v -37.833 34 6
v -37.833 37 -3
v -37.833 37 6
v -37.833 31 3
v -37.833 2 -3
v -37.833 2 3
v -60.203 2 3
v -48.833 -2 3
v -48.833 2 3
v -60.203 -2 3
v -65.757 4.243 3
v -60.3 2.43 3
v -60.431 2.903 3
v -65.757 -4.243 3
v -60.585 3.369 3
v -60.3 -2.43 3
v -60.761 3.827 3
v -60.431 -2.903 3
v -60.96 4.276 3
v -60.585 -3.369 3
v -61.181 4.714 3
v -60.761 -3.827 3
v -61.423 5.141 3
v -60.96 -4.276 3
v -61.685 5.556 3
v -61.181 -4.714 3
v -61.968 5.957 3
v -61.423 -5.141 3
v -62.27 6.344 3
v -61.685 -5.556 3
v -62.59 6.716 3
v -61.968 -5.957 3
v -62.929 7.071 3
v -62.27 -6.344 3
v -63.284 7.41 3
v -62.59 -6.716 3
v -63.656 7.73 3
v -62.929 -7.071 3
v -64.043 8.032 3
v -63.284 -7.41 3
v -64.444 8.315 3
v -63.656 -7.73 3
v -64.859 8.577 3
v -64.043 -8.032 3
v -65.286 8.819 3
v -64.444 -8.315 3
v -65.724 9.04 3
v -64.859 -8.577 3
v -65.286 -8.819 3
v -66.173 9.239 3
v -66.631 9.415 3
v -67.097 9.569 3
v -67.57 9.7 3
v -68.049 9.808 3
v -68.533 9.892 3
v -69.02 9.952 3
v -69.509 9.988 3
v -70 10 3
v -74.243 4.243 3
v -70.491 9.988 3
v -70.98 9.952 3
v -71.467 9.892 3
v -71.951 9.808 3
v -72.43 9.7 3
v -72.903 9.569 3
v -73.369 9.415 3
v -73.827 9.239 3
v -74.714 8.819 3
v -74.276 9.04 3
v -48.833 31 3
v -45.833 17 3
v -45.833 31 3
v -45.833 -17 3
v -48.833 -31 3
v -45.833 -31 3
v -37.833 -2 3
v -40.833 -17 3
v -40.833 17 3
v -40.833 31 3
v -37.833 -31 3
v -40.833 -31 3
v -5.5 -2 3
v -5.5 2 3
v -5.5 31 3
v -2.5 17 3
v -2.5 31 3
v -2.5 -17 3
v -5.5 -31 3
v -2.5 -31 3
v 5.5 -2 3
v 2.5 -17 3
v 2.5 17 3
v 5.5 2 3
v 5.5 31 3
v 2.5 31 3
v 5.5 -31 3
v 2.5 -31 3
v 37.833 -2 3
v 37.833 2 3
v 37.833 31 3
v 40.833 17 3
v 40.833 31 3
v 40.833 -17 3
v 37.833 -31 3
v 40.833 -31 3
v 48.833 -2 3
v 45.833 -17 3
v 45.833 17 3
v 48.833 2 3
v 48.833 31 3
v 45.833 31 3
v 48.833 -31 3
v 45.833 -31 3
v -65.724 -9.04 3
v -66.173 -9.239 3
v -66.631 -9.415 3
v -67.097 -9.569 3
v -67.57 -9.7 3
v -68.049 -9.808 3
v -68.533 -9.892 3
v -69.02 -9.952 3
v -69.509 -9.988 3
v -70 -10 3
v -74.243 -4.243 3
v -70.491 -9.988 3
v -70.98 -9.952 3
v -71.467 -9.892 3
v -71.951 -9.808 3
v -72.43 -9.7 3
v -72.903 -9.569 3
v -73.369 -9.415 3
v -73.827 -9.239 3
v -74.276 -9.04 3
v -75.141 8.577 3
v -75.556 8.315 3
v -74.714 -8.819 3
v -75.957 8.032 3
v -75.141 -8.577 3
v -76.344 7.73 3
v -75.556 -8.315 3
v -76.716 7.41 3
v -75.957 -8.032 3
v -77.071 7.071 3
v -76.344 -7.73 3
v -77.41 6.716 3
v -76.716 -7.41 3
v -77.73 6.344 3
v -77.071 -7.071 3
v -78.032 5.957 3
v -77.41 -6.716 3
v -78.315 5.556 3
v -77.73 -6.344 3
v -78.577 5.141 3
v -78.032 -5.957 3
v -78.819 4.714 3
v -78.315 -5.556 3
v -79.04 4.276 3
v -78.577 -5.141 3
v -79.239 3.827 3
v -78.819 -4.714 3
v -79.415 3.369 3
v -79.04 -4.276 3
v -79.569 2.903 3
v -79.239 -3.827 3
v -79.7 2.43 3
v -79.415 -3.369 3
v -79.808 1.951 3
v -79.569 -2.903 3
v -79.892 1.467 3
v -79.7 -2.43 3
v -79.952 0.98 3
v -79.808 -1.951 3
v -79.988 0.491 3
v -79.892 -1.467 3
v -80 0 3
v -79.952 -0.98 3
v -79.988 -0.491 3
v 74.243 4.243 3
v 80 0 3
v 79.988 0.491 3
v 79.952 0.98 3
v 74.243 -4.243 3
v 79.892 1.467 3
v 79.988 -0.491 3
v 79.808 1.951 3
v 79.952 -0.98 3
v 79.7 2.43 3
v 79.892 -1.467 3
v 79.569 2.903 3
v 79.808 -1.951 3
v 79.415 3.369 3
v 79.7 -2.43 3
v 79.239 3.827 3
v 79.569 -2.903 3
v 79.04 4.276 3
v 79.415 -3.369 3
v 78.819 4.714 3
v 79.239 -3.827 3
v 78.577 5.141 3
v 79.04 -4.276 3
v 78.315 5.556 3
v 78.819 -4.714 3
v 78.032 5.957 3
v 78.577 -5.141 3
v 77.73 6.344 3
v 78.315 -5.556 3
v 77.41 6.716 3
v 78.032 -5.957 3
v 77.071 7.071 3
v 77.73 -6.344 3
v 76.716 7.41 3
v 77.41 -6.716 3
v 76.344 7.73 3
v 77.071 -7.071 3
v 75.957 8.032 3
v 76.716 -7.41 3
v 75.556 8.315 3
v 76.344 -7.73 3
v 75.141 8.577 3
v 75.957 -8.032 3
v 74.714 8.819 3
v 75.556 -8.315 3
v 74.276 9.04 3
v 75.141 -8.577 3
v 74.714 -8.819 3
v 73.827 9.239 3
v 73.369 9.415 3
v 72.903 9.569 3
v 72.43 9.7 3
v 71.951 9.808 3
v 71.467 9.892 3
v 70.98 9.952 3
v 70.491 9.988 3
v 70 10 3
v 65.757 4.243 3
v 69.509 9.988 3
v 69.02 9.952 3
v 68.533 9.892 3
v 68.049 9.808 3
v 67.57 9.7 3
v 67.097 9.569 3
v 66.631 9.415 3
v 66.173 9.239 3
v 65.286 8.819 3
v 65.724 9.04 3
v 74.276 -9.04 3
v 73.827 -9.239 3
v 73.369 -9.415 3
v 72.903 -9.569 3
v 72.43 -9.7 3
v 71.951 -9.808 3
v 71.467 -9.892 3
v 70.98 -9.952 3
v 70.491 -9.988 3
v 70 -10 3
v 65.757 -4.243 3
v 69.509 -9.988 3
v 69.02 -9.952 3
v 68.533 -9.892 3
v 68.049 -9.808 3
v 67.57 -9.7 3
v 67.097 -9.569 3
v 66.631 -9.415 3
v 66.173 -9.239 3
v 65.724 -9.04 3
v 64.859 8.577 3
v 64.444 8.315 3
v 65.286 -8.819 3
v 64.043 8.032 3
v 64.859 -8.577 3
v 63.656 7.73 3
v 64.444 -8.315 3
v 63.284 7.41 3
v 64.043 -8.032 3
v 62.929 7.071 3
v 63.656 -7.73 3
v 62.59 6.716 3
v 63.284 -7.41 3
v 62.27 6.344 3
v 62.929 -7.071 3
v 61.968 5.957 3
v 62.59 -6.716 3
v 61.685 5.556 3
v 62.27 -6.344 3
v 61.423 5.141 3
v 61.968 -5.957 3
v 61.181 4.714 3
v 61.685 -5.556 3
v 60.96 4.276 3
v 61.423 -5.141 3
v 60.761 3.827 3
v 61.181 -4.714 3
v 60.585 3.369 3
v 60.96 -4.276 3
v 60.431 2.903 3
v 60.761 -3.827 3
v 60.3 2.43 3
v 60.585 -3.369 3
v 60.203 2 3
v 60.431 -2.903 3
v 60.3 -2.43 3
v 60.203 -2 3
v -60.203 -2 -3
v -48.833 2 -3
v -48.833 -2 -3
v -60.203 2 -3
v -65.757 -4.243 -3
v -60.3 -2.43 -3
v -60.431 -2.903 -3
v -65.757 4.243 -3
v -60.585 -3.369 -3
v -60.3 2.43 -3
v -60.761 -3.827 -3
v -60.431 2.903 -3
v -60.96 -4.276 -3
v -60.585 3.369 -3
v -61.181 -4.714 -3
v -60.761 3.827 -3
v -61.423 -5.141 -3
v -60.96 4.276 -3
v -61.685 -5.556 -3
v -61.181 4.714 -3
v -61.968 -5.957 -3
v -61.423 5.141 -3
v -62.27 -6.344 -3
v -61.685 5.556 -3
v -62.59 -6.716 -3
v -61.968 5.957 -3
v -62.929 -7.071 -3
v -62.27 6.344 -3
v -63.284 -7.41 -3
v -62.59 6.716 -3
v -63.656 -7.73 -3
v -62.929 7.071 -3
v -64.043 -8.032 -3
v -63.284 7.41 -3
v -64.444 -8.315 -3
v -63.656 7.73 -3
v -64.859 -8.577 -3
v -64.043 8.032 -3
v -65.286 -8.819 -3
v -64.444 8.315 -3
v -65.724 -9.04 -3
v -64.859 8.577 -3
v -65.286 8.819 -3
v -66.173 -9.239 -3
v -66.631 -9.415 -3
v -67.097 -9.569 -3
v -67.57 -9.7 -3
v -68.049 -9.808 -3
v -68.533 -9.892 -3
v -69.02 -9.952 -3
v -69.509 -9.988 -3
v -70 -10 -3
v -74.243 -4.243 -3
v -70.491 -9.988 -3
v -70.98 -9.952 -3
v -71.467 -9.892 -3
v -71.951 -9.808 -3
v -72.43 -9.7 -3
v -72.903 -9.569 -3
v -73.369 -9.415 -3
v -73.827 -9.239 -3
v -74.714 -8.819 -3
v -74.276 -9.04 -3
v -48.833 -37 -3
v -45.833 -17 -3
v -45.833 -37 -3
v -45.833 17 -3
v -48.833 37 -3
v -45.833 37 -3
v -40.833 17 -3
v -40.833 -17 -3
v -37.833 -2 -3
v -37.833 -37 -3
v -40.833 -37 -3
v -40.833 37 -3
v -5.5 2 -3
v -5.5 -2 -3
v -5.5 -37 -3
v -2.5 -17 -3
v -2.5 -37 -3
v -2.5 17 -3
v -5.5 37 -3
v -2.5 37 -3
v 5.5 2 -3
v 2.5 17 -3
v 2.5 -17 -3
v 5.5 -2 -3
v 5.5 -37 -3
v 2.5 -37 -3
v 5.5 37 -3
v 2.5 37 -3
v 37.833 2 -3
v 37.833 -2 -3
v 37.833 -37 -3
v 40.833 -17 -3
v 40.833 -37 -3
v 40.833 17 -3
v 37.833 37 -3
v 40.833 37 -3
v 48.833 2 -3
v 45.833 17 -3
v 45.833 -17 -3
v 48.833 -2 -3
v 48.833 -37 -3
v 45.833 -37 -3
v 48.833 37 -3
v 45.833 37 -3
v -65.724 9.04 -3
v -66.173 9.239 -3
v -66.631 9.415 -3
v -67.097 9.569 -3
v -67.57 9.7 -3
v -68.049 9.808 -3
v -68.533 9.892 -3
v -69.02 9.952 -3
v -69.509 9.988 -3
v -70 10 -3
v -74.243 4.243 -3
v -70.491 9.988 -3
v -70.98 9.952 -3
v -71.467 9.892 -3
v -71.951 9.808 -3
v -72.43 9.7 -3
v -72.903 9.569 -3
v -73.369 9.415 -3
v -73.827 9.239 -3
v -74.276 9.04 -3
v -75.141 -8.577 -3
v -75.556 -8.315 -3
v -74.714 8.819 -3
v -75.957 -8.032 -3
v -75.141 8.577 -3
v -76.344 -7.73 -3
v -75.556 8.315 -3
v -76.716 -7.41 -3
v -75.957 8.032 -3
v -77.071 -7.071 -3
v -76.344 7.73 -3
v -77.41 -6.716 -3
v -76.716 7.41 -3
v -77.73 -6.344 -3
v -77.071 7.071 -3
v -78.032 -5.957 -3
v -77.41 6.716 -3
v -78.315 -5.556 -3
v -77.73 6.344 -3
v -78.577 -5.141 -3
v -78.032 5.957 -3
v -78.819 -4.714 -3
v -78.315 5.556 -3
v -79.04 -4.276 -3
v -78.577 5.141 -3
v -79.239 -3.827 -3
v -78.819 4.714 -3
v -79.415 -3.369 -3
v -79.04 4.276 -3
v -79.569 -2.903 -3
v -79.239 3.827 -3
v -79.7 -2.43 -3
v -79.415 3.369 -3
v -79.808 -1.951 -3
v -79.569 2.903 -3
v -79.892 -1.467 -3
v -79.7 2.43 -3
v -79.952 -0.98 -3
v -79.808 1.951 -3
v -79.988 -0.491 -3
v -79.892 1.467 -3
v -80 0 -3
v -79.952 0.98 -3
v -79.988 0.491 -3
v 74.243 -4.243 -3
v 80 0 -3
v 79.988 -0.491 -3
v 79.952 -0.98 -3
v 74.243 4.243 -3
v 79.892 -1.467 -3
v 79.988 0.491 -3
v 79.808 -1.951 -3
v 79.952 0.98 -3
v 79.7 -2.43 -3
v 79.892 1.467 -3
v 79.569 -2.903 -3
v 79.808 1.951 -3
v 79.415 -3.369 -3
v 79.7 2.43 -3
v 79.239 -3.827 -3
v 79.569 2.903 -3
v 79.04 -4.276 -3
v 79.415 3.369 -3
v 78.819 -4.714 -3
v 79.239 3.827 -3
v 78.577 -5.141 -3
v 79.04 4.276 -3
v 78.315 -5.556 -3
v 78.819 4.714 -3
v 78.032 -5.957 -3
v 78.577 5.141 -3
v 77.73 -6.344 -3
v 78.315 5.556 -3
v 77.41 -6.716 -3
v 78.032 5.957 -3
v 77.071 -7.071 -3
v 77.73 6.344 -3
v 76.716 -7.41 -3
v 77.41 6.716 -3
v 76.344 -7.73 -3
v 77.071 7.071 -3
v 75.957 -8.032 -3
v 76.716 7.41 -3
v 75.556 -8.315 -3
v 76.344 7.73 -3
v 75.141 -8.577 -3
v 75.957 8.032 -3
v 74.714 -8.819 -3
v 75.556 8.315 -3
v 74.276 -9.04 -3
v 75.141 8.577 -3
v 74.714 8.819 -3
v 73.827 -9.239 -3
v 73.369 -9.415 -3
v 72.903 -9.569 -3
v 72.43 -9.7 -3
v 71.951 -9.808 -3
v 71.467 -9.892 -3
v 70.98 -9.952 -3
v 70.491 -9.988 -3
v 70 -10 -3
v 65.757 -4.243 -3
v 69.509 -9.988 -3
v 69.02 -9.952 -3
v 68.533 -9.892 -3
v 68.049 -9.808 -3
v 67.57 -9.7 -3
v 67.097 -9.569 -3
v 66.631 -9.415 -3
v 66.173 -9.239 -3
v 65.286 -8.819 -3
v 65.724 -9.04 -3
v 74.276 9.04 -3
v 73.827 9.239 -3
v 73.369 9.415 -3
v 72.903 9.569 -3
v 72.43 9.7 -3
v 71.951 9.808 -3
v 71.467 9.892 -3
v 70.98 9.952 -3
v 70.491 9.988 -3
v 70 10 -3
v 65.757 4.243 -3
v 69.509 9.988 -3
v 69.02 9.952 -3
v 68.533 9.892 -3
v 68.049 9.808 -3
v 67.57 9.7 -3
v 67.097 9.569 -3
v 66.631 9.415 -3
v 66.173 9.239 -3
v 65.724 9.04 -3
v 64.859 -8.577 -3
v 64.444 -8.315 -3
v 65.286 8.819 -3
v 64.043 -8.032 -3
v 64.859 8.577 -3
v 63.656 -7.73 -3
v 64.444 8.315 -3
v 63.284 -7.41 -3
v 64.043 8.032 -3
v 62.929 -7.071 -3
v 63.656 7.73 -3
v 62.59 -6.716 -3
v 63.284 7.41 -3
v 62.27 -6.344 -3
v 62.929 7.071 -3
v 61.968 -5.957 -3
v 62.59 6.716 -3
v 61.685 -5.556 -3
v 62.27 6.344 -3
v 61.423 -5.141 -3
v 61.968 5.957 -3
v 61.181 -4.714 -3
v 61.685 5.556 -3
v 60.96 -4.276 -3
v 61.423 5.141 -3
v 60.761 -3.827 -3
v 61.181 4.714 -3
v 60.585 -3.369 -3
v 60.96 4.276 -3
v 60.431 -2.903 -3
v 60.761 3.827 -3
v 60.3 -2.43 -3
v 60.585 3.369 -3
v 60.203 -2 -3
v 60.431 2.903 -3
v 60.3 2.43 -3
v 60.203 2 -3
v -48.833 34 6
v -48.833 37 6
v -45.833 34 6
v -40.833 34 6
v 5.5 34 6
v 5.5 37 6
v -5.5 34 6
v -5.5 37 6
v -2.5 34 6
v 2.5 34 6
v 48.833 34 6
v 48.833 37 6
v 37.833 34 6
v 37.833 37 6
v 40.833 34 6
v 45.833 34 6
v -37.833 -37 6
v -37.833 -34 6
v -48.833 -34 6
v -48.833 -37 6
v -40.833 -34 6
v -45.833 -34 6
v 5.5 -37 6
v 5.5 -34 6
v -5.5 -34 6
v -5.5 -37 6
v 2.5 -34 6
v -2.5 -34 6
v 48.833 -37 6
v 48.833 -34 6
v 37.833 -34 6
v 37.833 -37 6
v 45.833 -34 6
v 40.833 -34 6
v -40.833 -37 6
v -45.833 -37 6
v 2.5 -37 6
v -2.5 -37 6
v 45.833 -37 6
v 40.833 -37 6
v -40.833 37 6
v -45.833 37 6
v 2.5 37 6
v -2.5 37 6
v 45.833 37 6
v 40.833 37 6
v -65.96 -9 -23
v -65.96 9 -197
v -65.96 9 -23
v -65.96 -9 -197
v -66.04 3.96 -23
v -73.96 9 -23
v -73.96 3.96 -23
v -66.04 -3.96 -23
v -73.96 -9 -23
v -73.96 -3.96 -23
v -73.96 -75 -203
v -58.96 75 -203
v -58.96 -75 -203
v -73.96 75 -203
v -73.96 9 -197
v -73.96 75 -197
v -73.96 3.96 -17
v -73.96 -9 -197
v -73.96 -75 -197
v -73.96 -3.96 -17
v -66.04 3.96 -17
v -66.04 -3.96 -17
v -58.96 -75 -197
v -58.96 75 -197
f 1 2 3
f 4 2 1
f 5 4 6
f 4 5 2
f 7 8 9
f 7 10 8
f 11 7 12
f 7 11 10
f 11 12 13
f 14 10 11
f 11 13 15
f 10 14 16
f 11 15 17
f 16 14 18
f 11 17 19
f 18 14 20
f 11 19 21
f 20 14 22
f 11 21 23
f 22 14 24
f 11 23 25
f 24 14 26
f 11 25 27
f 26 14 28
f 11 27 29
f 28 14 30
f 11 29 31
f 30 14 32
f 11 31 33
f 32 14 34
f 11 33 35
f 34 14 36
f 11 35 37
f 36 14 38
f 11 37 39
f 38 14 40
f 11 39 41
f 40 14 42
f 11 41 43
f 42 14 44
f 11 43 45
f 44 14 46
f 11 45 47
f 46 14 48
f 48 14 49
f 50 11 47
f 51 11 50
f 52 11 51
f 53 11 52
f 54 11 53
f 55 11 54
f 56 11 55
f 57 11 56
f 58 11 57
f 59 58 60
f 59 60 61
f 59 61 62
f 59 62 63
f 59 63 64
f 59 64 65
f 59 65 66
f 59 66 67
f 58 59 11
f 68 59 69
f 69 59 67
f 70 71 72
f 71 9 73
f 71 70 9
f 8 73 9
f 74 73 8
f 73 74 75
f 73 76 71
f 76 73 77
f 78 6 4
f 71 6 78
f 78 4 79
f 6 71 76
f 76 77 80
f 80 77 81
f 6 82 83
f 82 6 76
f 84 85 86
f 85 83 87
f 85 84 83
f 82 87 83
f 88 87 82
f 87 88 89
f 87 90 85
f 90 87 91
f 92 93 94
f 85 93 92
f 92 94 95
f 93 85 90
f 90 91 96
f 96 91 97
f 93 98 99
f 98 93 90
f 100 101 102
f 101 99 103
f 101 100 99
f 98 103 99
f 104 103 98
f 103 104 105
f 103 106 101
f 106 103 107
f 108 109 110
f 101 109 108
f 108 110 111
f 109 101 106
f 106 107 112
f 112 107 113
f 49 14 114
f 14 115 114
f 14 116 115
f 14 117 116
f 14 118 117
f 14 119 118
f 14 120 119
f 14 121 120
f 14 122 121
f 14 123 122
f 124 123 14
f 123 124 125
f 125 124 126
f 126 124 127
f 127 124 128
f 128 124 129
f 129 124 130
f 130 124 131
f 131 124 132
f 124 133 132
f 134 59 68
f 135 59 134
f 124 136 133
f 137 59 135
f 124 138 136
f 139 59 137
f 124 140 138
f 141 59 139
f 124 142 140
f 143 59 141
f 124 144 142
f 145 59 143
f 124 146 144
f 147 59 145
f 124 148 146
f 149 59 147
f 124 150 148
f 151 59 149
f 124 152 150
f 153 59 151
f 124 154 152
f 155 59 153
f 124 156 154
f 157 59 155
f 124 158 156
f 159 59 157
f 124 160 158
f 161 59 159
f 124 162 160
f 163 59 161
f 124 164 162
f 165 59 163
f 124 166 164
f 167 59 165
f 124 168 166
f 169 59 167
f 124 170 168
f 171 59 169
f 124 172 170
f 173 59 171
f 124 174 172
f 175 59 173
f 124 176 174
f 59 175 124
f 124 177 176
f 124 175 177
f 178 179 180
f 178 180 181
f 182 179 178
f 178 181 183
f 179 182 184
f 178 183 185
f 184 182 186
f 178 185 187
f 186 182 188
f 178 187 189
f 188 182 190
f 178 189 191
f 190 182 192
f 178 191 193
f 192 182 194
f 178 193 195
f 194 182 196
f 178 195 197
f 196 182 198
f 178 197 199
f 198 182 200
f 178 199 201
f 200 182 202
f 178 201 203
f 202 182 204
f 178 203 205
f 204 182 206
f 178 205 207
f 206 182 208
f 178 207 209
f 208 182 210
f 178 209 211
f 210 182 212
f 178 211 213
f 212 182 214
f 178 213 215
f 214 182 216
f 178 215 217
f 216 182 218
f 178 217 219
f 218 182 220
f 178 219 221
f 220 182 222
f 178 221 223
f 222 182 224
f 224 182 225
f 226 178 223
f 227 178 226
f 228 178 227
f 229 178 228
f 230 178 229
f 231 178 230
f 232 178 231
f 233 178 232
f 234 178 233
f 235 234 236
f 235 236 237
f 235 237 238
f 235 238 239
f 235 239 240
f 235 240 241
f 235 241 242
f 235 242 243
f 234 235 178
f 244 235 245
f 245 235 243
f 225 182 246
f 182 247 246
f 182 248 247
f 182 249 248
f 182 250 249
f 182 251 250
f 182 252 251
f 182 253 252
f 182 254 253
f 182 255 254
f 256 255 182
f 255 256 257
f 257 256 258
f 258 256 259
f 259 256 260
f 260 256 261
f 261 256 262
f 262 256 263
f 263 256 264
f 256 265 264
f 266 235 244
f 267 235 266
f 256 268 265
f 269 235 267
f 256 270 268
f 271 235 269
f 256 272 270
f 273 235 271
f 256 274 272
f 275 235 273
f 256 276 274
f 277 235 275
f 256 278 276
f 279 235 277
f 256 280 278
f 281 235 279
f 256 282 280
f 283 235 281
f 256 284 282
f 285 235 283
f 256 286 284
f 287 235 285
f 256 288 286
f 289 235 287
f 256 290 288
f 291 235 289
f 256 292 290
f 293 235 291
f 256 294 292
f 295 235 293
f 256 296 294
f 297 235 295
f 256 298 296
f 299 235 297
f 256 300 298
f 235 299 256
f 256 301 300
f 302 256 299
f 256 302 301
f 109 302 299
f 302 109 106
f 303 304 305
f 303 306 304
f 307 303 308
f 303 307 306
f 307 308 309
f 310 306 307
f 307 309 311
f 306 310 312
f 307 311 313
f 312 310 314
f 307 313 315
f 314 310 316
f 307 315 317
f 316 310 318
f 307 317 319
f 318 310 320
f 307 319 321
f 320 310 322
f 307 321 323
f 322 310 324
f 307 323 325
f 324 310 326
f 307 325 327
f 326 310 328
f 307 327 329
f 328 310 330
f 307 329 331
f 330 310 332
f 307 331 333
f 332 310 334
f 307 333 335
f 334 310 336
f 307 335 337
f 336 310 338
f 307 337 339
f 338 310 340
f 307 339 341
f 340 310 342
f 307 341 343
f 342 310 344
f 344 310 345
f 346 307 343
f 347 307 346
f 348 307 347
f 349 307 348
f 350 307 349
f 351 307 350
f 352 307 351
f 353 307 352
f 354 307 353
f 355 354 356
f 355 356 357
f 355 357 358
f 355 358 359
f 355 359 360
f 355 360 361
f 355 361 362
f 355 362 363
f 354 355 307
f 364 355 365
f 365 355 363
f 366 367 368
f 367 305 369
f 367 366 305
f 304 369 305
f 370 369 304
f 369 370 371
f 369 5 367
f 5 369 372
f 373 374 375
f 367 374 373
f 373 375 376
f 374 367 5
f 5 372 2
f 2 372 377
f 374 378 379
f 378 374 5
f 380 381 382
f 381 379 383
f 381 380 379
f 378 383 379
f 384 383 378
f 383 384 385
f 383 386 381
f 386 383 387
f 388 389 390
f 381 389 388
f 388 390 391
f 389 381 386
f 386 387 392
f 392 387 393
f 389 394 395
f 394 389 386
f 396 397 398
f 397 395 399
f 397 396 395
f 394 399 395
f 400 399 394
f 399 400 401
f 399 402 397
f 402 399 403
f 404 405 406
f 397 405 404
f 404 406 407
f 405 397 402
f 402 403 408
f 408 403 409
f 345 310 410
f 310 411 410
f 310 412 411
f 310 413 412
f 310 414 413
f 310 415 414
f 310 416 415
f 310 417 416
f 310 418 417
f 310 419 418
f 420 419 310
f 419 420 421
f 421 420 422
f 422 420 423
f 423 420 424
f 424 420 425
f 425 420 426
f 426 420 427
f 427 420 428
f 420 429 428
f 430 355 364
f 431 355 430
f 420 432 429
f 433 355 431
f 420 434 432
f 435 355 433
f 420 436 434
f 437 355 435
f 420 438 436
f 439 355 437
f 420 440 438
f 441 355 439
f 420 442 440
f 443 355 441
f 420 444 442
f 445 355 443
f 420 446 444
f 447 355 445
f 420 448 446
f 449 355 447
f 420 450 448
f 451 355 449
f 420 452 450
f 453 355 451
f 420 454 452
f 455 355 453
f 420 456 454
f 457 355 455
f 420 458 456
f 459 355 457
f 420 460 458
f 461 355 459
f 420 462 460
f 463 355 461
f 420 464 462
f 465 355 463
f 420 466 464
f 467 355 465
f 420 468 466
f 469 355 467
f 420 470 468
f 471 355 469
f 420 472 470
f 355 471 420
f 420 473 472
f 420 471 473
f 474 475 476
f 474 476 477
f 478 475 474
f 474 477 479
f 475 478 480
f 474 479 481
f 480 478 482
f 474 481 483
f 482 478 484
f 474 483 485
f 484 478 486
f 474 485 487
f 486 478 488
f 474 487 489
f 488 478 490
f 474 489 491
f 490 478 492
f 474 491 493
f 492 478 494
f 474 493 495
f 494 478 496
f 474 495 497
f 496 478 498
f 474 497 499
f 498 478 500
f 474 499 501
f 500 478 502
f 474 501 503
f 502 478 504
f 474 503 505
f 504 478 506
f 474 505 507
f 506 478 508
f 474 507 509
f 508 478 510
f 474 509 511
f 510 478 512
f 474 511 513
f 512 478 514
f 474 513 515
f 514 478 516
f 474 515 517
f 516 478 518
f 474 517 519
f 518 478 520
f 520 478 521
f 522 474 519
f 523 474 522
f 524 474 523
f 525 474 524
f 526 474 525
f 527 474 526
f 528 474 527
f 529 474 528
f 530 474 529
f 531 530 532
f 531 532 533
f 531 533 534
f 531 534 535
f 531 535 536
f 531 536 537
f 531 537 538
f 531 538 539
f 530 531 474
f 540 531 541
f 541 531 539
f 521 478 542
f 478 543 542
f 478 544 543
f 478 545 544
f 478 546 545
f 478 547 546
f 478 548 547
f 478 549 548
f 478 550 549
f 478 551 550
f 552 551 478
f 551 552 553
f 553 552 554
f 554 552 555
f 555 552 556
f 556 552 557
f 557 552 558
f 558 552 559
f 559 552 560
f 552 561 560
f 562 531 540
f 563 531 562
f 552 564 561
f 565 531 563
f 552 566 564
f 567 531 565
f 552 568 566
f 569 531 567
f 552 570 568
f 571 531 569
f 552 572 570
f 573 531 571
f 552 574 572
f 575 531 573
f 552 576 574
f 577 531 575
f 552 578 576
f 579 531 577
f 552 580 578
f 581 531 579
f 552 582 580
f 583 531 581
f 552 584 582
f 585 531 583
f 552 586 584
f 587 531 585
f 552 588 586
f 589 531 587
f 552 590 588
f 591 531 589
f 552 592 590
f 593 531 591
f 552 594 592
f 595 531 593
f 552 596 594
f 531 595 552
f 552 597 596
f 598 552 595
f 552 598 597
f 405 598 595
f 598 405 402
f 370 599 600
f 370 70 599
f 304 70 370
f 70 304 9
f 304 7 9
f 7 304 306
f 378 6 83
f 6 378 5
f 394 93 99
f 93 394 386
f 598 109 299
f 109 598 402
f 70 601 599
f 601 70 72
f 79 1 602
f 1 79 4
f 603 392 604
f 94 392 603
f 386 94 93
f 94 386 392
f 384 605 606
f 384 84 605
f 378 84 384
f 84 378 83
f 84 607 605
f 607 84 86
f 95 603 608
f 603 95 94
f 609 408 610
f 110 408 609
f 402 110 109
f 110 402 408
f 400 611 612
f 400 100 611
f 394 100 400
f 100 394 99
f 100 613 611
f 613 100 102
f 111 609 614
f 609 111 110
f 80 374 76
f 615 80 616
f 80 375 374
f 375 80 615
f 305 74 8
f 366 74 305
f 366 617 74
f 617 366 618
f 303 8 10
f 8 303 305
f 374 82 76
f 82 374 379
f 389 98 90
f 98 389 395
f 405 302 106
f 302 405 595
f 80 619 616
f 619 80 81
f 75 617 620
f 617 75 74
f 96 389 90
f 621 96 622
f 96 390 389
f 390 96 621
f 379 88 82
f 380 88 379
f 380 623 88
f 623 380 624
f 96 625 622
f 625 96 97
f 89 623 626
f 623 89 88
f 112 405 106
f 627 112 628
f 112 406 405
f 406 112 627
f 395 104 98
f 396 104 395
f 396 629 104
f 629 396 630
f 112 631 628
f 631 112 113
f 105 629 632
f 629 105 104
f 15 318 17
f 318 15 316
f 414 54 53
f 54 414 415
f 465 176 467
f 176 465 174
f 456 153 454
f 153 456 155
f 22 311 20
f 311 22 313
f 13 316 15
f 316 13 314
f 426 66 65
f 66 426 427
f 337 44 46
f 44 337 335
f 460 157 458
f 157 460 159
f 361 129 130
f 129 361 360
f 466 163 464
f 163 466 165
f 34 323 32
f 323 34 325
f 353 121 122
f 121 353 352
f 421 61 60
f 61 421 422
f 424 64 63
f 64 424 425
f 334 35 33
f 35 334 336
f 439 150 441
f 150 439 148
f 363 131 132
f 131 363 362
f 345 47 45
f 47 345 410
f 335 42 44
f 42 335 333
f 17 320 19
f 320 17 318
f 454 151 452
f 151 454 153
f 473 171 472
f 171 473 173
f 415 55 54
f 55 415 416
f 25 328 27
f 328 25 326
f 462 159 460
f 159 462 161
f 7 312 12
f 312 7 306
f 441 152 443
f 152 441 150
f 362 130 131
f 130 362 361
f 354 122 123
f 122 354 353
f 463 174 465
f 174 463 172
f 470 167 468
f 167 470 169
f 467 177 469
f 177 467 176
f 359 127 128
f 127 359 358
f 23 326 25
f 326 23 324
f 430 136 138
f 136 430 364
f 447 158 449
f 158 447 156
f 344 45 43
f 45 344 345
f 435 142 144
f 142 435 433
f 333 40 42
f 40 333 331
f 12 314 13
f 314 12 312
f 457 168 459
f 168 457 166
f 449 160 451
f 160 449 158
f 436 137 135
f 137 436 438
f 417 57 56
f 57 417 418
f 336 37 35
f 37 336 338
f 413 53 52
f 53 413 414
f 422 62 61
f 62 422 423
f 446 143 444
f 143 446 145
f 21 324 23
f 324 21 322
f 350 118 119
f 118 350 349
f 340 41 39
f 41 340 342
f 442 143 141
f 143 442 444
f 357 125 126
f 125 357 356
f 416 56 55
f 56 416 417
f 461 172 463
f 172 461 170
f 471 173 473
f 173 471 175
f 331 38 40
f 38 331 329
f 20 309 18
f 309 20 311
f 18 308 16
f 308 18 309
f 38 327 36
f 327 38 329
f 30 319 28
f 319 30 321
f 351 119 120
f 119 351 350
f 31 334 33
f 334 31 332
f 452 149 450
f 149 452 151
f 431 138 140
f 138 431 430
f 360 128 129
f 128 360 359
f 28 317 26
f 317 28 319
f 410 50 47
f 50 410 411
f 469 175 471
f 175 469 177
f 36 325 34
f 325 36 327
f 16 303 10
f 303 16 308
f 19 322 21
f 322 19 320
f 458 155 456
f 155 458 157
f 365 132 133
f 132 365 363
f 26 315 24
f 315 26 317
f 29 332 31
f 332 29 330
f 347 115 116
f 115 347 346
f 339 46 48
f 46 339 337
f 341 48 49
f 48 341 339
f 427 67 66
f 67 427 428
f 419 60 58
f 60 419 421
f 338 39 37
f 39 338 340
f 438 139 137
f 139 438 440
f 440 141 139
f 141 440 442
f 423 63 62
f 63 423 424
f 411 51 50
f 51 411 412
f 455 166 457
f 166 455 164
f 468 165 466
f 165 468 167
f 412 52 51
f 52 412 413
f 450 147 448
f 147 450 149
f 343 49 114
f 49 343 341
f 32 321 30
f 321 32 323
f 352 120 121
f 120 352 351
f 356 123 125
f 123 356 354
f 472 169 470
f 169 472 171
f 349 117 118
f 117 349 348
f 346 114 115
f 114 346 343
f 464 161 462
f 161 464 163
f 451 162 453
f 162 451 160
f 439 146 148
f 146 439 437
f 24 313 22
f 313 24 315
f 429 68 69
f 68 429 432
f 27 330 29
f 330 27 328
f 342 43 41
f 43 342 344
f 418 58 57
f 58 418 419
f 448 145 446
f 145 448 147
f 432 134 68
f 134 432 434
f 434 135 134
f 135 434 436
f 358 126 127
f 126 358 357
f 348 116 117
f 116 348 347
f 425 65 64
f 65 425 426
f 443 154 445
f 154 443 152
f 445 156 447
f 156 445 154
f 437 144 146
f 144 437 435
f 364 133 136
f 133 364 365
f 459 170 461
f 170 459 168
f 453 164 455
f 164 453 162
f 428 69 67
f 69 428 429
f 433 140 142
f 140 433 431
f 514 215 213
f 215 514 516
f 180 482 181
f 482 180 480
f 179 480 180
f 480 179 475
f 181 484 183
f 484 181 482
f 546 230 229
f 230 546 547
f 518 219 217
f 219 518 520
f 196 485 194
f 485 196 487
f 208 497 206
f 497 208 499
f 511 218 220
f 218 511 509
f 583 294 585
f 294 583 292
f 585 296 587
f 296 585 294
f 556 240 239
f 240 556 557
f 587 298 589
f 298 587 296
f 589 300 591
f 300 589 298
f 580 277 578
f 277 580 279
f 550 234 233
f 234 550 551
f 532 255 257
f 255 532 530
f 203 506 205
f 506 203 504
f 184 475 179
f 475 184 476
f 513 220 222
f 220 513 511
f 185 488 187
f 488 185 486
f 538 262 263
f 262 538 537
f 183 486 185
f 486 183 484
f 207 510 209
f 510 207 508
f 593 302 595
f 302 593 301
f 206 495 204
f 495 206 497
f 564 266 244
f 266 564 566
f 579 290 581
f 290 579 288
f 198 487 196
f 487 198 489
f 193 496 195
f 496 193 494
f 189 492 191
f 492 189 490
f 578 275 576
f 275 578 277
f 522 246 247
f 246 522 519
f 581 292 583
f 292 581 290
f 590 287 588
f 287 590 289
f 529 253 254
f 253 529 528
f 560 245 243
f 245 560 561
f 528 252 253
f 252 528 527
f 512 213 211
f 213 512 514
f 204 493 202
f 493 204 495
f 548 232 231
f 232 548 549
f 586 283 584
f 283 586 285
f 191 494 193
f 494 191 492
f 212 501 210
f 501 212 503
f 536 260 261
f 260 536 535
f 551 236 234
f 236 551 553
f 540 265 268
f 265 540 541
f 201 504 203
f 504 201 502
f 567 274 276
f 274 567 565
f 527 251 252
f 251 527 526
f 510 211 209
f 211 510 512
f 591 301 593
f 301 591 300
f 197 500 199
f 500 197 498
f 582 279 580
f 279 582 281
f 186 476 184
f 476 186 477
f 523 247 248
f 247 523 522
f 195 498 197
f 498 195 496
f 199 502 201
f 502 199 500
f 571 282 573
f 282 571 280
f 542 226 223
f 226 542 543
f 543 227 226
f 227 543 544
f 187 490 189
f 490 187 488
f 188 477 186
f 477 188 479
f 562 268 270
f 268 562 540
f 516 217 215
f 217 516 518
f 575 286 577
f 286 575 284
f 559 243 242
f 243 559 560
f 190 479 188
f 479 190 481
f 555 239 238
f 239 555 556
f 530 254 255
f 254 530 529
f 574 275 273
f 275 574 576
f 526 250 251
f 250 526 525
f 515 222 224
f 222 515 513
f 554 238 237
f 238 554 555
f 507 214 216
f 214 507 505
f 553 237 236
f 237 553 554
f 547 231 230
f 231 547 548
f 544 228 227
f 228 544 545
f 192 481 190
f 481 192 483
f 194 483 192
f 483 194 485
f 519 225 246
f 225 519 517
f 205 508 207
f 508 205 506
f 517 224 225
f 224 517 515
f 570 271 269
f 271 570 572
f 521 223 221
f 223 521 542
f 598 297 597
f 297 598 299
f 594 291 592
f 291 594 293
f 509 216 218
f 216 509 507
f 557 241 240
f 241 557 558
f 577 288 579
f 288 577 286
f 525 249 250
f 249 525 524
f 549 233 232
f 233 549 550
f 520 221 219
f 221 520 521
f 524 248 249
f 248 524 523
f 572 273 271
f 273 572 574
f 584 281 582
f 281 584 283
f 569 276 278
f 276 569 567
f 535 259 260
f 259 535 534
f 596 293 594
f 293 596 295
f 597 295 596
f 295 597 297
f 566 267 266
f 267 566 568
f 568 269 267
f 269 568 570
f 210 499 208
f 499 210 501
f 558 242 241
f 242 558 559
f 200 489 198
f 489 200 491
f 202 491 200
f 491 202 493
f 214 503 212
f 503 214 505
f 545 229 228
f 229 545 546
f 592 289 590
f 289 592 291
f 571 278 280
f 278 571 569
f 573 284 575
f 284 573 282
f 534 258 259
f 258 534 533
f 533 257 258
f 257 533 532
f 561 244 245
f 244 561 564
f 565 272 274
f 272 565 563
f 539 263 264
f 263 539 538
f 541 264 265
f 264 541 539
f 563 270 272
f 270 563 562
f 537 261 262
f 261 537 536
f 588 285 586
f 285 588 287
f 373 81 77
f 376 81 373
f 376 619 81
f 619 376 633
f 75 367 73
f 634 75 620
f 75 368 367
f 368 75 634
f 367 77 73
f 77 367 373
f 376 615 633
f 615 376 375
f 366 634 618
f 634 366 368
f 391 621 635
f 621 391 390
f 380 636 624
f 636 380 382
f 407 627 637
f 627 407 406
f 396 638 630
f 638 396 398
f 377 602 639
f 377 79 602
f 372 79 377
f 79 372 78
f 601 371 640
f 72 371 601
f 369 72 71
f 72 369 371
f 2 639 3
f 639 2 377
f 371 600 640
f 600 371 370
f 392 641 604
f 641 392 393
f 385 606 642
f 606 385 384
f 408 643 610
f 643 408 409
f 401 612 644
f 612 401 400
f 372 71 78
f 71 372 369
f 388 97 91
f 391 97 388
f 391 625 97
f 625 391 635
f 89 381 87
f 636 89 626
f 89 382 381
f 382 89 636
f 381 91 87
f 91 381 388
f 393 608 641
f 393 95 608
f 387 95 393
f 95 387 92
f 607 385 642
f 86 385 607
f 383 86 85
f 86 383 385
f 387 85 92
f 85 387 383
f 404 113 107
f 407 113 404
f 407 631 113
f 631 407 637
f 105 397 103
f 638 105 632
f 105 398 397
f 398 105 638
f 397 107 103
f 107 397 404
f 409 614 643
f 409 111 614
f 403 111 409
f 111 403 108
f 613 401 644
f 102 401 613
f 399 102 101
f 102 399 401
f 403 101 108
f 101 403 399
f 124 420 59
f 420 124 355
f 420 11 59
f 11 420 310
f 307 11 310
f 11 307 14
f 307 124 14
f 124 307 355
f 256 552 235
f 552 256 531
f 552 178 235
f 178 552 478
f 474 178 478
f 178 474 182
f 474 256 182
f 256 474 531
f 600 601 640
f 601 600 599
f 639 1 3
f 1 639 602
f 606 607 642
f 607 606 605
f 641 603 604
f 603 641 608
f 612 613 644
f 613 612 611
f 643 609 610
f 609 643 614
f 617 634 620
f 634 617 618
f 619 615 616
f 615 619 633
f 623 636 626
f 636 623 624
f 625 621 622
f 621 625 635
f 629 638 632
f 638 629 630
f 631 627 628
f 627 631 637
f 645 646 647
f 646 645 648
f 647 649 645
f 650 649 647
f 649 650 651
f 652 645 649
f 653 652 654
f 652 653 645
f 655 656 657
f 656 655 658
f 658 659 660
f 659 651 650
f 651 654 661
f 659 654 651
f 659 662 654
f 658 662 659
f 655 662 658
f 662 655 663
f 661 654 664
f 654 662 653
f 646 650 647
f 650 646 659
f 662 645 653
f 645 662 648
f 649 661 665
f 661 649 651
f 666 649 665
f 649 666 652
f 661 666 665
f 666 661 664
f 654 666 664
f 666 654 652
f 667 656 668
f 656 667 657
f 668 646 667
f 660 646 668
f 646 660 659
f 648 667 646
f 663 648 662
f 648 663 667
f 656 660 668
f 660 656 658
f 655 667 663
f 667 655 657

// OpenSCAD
////////////////////////////////////////////////////////////////////////////////
// Micropipette Rack
// Original: PIPETTE RACK v1 (2014-02-24) by Tom Baden (Thingiverse ID: tbaden)
// Inspired by kwalus (http://www.thingiverse.com/thing:64977)
////////////////////////////////////////////////////////////////////////////////

// ==============================
// User-tunable parameters
// ==============================

/* [Parameters:] */

// One- or two-sided version
side_count = 2; // [1,2]

// Rack dimensions
rack_length = 130; // [50:300]
rack_height = 180; // [150:220]

// Foot dimensions
foot_width = 150; // [100:200]
foot_length = 15; // [10:30]

// Material thickness multiplier
stability = 2; // [1:4]

// Printer precision tolerance
tol = 0.4; // [0.1,0.2,0.3,0.4,0.5]

/* [Preview Controls:] */
show_top_beam = true; // [true,false]
show_side_support = true; // [true,false]

// -----------------------------------------------------------------------------
// CUSTOMIZER CUTOFF: modify below at your own risk
// -----------------------------------------------------------------------------
module customizer_cutoff(){}; // legacy marker

// ==============================
// Global constants
// ==============================

$fn = $preview ? 32 : 128;
z_fight = $preview ? 0.05 : 0;

sep = 20;

X = rack_length;
Z = rack_height;
Y = 18;

wall_y = 2 * stability;
wall_z = 3 * stability;
wall_x = 4 * stability;

hanger_x = 11;
hanger_y = 35;

slot_depth = 20;
slot_width = 5;

radius_end = 10;
radius_inner = 6;
radius_inner_fit = radius_inner - tol;
connect_width = sqrt(radius_inner_fit * radius_inner_fit * 2);

triangle_top = 30;
slot_count = round(X / 50);
is_double = (side_count == 2);

// ==============================
// Part A – Top beam with hangers
// ==============================

module top_beam() {
  // main beam
  cube([X, wall_y, wall_z], center=true);

  // rounded ends
  translate([-X / 2 - radius_end / 2, 0, 0])
    cylinder(r=radius_end, h=wall_z, center=true);
  translate([X / 2 + radius_end / 2, 0, 0])
    cylinder(r=radius_end, h=wall_z, center=true);

  // hangers
  for (i = [1:slot_count]) {
    x_pos = -X / 2 + (i - 0.5) * X / slot_count;

    // front side hanger
    translate([x_pos, -hanger_y / 2 - wall_y / 2, 0])
      cube([hanger_x, hanger_y, wall_z], center=true);
    translate([x_pos, -hanger_y - wall_y / 2, wall_z / 2])
      rotate([45, 0, 0])
        cube([hanger_x, sqrt(2) * wall_z, sqrt(2) * wall_z], center=true);

    if (is_double) {
      // back side hanger
      translate([x_pos, hanger_y / 2 + wall_y / 2, 0])
        cube([hanger_x, hanger_y, wall_z], center=true);
      translate([x_pos, hanger_y + wall_y / 2, wall_z / 2])
        rotate([45, 0, 0])
          cube([hanger_x, sqrt(2) * wall_z, sqrt(2) * wall_z], center=true);
    }
  }
}

module top_beam_cutouts() {
  // end-holes (square)
  translate([-X / 2 - radius_end / 2, 0, 0])
    rotate([0, 0, 45])
      cylinder($fn=4, r=radius_inner, h=wall_z + z_fight, center=true);
  translate([X / 2 + radius_end / 2, 0, 0])
    rotate([0, 0, 45])
      cylinder($fn=4, r=radius_inner, h=wall_z + z_fight, center=true);

  // tip slots
  for (i = [1:slot_count]) {
    x_pos = -X / 2 + (i - 0.5) * X / slot_count;
    translate([x_pos, slot_depth / 2 - hanger_y - wall_y / 2 - z_fight, wall_z / 2])
      cube([slot_width, slot_depth, wall_z * 2 + z_fight], center=true);
    if (is_double)
      translate([x_pos, -slot_depth / 2 + hanger_y + wall_y / 2 + z_fight, wall_z / 2])
        cube([slot_width, slot_depth, wall_z * 2 + z_fight], center=true);
  }

  // side end cuts
  translate([0, -hanger_y - wall_y * 1.5, wall_z / 2])
    cube([X, wall_y * 2, wall_z * 2], center=true);
  translate([0, hanger_y + wall_y * 1.5, wall_z / 2])
    cube([X, wall_y * 2, wall_z * 2], center=true);

  // top surface cut
  translate([0, 0, wall_z * 1.5])
    cube([X, (hanger_y + wall_y) * 2, wall_z], center=true);
}

// Emit Part A
if (show_top_beam)
  difference() { top_beam(); top_beam_cutouts(); }

// ==============================
// Part B – Side support & foot
// ==============================
module side_support() {
  // vertical leg
  translate([-X / 2 - radius_end / 2 - connect_width / 2 + wall_x / 2, 0, -Z / 2 - wall_z / 2 - sep])
    cube([wall_x, Y, Z], center=true);

  // connection socket
  translate([-X / 2 - radius_end / 2, 0, -sep])
    rotate([0, 0, 45])
      cylinder($fn=4, r=radius_inner_fit, h=wall_z, center=true);

  // foot pad
  translate([-X / 2 - radius_end / 2 - connect_width / 2 + foot_length / 2, 0, -Z - sep])
    cube([foot_length, foot_width, wall_z], center=true);
}

if (show_side_support)
  side_support();

// ==============================
// End of file
// ==============================
